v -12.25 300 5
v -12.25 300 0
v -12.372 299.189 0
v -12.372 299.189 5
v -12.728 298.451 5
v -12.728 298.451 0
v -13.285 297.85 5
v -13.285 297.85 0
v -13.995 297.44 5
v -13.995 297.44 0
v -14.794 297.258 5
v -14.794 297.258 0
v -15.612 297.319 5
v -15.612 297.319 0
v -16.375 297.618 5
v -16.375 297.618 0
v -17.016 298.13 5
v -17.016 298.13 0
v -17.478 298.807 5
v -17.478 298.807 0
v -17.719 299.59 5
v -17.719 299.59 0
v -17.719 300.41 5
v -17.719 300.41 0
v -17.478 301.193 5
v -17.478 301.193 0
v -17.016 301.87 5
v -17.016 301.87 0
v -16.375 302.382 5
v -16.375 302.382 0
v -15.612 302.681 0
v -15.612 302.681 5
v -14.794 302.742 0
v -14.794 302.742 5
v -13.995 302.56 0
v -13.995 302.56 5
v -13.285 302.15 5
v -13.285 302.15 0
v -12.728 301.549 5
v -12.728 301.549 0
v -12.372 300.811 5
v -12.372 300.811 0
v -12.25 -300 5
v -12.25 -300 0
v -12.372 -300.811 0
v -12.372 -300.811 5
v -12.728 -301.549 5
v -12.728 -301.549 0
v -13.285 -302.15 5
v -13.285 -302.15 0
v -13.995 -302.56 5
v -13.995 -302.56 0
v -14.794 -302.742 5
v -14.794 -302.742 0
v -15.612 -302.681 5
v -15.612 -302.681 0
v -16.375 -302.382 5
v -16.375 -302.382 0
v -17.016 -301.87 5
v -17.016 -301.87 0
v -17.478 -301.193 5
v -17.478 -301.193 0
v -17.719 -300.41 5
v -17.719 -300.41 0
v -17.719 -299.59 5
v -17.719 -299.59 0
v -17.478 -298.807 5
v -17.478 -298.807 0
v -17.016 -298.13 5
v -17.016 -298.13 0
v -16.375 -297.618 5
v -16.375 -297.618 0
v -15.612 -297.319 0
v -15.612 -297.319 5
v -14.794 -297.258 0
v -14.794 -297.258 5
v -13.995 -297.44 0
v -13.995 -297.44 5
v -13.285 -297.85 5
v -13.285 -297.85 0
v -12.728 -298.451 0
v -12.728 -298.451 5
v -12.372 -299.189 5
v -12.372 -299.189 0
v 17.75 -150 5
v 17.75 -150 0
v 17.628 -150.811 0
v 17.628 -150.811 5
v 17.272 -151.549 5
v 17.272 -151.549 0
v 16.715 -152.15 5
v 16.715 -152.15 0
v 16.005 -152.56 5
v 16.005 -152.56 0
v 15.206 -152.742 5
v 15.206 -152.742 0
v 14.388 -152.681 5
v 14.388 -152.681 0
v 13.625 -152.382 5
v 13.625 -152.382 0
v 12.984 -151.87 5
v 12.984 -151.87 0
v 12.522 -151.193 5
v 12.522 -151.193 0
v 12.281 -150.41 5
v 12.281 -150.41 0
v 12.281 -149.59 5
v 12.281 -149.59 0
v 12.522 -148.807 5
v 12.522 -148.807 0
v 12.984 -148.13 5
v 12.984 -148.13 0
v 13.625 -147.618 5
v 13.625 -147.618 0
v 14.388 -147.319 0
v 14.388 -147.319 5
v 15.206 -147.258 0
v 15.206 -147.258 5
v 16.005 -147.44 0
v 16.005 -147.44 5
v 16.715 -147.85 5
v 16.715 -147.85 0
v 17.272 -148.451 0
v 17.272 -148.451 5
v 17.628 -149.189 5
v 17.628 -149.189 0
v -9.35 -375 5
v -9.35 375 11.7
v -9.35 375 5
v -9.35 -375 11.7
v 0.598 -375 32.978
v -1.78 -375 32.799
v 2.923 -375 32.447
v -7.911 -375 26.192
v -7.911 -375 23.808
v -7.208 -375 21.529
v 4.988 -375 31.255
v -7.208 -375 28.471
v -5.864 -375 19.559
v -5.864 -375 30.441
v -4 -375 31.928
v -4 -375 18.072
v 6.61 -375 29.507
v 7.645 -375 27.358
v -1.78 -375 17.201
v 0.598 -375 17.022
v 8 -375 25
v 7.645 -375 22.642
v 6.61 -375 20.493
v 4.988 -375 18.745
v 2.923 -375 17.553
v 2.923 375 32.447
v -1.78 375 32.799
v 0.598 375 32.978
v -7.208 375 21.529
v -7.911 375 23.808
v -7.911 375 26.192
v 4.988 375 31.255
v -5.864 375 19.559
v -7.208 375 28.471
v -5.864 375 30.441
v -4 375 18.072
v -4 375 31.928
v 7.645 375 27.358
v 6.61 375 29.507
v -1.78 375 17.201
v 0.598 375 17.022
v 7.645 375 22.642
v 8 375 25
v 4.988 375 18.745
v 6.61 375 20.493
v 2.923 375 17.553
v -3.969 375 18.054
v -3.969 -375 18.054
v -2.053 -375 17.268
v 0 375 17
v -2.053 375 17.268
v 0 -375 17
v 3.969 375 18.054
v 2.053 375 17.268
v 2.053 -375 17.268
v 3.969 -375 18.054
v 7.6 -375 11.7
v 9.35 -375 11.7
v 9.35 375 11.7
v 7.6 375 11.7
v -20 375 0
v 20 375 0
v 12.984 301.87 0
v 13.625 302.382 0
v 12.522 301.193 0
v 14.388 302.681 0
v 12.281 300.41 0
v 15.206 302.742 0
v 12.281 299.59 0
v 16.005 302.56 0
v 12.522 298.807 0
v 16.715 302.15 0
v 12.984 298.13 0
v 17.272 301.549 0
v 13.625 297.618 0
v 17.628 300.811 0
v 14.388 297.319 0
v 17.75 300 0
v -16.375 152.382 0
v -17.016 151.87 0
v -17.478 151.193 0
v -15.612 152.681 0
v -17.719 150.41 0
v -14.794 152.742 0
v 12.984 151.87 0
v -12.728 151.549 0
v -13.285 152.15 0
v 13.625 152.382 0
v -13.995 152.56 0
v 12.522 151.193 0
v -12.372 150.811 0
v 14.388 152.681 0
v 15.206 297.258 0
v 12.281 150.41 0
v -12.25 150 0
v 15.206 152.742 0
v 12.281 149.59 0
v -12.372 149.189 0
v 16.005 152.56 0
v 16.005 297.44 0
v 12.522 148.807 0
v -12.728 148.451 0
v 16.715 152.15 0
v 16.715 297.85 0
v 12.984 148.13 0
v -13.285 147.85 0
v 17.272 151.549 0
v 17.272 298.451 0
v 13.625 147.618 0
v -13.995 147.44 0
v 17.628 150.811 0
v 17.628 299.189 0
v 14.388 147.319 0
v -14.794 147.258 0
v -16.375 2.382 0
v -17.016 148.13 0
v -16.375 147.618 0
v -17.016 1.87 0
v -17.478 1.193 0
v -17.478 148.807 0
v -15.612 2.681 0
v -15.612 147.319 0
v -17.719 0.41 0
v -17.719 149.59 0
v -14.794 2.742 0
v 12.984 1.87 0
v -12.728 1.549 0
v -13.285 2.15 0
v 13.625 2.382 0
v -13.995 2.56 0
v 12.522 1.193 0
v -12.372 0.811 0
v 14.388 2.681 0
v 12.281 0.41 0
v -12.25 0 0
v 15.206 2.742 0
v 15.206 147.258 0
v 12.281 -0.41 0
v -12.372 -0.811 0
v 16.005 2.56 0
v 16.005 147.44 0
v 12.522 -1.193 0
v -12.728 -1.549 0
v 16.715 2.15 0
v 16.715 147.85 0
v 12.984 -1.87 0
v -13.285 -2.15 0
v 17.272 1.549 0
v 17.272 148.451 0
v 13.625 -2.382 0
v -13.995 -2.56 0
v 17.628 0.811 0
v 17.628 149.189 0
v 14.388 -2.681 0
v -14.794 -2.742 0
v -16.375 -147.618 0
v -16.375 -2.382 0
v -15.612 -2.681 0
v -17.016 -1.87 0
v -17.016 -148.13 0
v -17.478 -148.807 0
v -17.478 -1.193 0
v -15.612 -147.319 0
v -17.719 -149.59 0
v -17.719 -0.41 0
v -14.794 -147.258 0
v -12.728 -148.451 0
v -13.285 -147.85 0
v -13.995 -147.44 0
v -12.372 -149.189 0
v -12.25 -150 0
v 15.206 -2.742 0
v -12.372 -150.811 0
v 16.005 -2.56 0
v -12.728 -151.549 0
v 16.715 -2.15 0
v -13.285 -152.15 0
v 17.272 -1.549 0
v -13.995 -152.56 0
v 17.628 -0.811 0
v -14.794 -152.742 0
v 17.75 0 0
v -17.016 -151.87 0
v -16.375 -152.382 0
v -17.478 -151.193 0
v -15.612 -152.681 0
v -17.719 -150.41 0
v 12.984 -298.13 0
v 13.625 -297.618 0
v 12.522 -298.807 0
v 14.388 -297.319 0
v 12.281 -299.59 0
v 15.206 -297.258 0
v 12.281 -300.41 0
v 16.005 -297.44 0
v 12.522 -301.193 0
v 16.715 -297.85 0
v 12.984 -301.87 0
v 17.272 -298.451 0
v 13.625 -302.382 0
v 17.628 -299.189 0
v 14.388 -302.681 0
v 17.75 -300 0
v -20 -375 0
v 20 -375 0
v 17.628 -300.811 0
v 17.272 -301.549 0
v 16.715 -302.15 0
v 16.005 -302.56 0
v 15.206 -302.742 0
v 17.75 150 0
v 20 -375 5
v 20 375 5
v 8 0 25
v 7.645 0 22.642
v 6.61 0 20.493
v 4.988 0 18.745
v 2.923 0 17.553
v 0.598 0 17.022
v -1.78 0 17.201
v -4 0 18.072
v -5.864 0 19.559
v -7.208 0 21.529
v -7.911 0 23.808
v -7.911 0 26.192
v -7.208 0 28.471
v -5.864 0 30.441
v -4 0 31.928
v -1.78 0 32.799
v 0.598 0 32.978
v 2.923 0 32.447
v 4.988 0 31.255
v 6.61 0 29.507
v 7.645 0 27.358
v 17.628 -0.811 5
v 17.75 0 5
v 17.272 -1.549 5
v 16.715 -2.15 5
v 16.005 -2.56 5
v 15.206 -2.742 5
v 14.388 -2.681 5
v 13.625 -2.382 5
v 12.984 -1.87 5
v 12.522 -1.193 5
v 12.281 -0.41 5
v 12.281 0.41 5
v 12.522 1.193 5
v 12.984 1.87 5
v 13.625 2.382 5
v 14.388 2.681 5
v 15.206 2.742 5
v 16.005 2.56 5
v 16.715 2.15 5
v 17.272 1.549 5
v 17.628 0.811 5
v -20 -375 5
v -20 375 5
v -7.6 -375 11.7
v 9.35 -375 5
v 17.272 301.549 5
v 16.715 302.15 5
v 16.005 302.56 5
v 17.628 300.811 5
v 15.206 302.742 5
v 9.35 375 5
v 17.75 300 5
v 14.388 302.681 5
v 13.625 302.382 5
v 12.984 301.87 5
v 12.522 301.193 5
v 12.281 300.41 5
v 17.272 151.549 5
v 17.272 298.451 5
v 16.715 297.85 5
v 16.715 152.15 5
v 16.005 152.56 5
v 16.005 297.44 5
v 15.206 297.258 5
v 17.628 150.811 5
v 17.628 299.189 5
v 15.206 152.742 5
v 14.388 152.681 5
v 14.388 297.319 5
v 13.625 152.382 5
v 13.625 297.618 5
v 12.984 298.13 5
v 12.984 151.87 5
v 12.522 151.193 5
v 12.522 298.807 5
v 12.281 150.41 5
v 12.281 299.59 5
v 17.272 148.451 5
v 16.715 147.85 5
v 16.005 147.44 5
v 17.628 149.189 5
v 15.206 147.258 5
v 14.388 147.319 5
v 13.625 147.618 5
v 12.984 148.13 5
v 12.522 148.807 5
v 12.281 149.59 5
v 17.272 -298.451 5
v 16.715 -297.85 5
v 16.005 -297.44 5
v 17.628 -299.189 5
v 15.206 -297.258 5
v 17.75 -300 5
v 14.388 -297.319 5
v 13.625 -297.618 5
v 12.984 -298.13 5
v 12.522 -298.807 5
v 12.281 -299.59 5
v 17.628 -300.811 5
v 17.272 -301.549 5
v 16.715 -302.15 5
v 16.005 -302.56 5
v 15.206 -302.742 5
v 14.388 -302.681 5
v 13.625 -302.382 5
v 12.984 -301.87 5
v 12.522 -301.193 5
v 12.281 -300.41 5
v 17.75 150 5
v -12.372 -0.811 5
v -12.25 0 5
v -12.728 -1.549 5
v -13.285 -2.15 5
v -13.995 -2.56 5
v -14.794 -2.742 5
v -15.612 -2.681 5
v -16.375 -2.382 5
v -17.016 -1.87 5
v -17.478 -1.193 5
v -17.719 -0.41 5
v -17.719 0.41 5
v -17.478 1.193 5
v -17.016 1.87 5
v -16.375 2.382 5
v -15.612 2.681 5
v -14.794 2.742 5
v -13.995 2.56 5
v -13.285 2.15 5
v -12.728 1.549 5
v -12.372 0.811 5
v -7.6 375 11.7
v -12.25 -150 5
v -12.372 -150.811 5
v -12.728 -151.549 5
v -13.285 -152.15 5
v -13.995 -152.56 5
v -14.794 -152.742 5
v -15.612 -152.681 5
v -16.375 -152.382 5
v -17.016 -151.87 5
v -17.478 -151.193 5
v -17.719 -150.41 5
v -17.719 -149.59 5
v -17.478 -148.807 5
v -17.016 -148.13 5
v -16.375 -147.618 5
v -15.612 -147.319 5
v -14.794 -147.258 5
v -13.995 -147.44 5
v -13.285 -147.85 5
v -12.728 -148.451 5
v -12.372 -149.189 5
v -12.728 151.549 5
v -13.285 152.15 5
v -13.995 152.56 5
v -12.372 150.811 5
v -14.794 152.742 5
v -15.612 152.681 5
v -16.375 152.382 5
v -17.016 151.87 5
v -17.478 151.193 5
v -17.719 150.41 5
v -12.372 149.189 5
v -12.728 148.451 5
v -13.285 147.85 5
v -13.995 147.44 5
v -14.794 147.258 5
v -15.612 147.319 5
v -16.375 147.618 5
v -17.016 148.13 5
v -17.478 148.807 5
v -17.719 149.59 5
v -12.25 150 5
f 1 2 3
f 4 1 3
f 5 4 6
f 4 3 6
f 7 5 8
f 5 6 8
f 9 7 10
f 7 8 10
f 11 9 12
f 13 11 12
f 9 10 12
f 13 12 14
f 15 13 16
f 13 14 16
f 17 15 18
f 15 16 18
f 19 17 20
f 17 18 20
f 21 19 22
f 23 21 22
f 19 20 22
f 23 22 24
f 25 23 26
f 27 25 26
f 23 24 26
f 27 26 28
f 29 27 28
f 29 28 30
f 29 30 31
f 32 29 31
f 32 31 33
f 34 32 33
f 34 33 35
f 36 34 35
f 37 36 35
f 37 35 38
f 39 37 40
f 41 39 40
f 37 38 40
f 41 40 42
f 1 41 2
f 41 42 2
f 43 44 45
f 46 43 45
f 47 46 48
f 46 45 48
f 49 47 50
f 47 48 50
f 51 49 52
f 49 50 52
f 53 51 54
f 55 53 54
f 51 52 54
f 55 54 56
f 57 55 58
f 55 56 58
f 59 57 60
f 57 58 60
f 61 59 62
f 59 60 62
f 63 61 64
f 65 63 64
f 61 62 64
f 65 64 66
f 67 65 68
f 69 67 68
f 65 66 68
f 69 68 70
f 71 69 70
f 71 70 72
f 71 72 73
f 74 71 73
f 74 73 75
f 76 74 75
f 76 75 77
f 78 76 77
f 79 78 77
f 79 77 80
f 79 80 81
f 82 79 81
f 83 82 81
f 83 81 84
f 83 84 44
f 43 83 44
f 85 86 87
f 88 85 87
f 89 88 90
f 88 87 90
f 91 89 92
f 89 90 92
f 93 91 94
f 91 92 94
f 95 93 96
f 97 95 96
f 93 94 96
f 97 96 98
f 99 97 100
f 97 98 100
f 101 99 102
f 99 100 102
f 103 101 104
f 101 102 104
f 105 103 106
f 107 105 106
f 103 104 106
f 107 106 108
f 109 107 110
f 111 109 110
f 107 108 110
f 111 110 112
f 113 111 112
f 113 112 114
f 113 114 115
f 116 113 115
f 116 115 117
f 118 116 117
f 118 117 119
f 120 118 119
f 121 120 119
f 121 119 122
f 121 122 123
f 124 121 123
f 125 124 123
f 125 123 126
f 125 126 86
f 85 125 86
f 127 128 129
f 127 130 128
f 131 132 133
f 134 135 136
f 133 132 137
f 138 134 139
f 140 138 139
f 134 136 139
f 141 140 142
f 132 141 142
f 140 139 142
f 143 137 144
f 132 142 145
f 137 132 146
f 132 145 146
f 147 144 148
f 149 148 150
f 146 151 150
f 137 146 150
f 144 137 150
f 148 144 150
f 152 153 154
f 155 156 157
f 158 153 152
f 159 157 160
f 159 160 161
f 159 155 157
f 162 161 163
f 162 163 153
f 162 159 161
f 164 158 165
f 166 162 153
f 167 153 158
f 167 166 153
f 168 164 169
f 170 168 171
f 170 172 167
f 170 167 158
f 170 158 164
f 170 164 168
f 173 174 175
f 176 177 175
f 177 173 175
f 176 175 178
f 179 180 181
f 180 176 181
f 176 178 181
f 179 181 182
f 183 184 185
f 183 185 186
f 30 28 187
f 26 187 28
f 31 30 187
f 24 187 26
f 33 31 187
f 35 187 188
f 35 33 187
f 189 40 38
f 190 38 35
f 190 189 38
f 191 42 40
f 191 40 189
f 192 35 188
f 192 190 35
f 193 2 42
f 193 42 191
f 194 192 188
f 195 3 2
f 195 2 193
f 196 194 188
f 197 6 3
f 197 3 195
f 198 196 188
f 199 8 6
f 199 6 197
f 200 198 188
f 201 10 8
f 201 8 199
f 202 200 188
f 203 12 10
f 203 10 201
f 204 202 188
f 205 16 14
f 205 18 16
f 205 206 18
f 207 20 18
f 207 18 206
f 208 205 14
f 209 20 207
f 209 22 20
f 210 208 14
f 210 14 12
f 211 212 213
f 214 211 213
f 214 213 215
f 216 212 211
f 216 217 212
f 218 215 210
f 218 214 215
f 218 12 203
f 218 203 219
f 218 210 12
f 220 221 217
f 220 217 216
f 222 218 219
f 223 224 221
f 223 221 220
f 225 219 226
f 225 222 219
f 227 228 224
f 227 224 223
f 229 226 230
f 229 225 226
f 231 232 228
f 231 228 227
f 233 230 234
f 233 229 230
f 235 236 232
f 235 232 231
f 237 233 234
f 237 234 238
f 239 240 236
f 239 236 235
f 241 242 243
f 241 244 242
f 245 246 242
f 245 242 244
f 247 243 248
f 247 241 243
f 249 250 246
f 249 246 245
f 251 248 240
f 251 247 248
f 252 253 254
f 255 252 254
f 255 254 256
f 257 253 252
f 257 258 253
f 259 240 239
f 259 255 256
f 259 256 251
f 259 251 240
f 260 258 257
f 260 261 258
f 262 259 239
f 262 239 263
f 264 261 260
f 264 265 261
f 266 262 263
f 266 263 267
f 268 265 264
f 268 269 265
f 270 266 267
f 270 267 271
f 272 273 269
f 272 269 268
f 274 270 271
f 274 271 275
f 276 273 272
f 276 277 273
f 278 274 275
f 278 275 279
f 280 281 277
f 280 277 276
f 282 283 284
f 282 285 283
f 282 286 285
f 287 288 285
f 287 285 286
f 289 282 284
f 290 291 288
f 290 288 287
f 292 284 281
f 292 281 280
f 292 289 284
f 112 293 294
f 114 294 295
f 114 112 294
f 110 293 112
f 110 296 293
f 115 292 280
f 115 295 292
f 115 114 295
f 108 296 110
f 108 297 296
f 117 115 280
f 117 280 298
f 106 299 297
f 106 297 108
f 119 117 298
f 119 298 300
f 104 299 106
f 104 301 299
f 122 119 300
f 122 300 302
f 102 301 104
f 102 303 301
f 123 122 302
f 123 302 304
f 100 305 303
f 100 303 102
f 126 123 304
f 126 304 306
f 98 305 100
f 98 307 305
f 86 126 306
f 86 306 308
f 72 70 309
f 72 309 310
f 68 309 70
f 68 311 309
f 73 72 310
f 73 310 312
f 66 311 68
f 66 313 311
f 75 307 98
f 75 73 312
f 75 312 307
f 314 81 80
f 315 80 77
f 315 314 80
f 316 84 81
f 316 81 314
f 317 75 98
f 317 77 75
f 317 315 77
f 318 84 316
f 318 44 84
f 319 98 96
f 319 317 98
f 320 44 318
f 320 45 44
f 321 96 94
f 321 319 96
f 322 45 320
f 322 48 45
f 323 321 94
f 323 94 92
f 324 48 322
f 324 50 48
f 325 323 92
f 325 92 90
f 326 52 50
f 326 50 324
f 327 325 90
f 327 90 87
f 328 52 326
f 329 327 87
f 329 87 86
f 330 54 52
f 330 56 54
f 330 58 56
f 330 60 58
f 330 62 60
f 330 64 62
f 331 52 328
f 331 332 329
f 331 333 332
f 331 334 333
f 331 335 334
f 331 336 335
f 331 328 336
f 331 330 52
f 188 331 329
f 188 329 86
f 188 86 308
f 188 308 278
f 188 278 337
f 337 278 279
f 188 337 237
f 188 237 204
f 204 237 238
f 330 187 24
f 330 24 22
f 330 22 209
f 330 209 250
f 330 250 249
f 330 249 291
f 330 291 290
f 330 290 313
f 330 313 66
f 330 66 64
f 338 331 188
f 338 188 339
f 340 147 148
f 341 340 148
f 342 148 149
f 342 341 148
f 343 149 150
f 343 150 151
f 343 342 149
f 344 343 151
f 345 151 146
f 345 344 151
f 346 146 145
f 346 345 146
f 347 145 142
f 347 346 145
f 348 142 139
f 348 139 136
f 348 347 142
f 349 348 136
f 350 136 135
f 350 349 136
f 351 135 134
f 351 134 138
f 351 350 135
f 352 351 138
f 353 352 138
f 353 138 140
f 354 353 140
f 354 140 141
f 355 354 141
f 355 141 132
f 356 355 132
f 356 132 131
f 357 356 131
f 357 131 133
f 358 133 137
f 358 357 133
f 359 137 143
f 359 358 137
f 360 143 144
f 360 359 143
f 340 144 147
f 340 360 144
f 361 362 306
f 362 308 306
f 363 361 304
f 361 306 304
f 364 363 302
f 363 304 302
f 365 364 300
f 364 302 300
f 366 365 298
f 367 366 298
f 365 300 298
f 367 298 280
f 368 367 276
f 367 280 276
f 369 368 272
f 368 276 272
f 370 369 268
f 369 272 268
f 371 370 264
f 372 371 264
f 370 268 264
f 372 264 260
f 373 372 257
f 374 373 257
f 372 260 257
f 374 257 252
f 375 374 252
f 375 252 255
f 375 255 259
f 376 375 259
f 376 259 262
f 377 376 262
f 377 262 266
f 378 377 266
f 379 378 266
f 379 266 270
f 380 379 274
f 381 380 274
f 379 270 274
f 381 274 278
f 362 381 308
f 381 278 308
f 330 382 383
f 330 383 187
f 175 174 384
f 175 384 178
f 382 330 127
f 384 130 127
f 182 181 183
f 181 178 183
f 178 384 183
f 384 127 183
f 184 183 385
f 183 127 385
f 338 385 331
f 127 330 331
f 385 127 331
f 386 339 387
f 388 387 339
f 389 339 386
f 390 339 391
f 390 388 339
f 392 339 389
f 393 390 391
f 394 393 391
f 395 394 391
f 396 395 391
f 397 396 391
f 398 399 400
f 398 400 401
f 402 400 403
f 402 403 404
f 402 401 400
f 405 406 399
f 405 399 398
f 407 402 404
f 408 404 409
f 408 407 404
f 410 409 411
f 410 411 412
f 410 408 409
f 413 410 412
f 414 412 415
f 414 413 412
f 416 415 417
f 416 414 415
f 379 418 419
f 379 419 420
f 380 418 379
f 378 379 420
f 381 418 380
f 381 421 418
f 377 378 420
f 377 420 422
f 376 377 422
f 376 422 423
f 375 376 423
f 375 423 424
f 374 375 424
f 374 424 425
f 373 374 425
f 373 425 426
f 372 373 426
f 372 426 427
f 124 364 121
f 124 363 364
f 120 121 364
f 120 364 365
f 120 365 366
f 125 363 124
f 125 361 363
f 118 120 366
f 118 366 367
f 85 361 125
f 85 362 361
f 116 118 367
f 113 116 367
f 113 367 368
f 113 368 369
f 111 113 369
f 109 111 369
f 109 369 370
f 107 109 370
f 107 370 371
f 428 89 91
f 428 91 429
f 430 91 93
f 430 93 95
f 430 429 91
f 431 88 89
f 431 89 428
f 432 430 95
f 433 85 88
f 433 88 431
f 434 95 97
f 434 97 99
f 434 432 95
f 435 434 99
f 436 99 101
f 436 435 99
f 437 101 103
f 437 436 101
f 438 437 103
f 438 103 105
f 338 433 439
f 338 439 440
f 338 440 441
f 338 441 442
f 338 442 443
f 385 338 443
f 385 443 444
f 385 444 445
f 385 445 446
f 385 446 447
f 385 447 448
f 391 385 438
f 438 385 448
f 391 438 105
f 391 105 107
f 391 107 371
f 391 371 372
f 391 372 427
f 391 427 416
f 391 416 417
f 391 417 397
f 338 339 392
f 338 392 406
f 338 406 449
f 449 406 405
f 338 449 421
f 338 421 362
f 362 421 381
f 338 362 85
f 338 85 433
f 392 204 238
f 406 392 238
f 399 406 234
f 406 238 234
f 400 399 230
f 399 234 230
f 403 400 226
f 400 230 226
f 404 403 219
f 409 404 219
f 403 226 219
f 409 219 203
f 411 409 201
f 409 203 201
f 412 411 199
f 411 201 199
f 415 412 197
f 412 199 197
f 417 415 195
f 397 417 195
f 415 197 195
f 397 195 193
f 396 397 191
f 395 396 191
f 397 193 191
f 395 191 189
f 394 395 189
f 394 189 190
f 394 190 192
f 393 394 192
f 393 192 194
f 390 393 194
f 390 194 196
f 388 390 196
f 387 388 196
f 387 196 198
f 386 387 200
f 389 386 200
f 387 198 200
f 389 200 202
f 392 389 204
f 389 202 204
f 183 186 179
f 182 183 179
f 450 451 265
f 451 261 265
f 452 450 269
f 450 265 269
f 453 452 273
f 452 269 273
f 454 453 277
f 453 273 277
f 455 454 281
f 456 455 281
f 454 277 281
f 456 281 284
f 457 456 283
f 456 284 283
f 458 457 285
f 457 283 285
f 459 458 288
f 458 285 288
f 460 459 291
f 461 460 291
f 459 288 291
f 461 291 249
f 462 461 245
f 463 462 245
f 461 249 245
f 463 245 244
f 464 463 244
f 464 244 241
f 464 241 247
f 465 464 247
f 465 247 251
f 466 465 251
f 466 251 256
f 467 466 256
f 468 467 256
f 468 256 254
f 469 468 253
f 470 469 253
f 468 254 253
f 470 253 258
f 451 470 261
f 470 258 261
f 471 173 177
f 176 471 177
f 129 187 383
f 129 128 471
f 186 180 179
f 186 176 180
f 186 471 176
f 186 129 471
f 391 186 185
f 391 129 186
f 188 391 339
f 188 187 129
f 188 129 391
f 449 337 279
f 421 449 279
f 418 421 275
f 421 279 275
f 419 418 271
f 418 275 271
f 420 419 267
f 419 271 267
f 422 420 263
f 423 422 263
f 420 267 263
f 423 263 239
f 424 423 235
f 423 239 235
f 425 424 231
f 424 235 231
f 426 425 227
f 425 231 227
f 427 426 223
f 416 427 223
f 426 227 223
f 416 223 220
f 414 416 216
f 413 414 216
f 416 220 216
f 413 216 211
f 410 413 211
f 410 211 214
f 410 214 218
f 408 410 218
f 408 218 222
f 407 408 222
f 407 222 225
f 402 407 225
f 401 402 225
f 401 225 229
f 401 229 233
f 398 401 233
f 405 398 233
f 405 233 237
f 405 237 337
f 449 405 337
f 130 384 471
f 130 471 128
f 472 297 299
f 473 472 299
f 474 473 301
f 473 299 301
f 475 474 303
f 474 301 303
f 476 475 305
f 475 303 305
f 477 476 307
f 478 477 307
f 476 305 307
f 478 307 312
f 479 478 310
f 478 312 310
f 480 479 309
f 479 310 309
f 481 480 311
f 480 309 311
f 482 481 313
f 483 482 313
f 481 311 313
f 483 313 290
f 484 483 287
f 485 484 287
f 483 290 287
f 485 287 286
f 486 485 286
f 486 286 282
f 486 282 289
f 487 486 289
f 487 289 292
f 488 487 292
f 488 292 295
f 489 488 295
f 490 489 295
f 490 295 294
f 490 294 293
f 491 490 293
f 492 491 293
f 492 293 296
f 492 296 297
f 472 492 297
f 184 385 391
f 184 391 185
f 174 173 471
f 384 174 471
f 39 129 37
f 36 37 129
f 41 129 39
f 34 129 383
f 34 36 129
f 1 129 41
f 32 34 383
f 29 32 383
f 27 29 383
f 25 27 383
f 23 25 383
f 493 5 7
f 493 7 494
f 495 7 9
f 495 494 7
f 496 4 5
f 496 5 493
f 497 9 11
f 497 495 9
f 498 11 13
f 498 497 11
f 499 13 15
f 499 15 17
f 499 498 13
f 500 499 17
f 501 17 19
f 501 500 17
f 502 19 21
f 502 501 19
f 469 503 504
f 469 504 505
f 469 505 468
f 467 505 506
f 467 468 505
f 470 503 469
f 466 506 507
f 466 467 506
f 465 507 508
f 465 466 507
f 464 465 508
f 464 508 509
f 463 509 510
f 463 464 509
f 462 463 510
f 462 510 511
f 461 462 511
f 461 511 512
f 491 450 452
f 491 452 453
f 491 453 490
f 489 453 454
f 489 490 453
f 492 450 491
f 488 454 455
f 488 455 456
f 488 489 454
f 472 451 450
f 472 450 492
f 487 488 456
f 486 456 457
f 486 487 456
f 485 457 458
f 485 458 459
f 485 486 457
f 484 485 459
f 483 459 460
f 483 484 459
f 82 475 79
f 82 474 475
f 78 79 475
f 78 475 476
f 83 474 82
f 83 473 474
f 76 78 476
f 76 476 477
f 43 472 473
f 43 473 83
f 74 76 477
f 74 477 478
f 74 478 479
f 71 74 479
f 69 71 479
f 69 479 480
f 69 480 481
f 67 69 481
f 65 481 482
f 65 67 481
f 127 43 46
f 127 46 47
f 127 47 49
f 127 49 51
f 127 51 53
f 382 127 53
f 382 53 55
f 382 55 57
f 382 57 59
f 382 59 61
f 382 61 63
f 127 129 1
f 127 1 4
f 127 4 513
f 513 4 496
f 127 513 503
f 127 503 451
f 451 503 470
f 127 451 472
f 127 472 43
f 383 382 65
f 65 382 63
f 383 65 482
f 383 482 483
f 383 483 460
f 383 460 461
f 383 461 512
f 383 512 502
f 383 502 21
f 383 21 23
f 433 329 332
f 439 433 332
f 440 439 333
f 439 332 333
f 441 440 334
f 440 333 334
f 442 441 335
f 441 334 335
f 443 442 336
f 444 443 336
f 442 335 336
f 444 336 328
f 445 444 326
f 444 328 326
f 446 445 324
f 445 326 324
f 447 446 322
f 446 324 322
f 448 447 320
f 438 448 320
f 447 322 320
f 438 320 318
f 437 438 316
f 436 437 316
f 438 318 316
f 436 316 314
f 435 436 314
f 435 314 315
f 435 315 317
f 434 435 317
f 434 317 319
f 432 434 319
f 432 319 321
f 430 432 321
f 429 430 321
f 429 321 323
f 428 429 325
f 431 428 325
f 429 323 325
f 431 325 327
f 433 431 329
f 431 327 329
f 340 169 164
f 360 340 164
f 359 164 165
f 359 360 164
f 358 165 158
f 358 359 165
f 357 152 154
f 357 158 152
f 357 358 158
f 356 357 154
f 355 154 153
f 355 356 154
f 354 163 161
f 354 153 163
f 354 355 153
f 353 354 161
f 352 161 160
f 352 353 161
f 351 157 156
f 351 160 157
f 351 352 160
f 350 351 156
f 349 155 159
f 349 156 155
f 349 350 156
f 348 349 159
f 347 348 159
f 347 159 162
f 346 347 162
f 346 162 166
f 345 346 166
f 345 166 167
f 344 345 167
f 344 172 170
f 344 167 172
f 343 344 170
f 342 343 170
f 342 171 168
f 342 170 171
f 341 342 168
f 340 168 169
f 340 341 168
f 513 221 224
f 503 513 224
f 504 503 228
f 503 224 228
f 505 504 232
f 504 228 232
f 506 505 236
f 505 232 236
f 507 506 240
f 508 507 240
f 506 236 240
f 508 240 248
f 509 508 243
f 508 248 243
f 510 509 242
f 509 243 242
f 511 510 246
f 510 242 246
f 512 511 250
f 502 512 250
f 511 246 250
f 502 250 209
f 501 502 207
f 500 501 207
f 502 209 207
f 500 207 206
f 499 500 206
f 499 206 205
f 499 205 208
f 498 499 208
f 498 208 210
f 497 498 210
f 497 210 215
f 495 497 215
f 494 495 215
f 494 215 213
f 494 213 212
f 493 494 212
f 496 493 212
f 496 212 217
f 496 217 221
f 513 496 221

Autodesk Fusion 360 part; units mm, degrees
sketch "Alu Support" plane through (0, 0, 0) normal (0, 1, 0) x (1, 0, 0)
  line L0 (-20, 0.0005) -> (20, 0.0005)
  line L1 (20, 0.0005) -> (20, -4.9995)
  line L2 (20, -4.9995) -> (9.35, -4.9995)
  line L3 (9.35, -4.9995) -> (9.35, -11.6995)
  line L4 (9.35, -11.6995) -> (7.6, -11.6995)
  line L5 (7.6, -11.6995) -> (3.9691, -18.0536)
  line L6 (-3.9691, -18.0536) -> (-7.6, -11.6995)
  line L7 (-7.6, -11.6995) -> (-9.35, -11.6995)
  line L8 (-9.35, -11.6995) -> (-9.35, -4.9995)
  line L9 (-9.35, -4.9995) -> (-20, -4.9995)
  line L10 (-20, -4.9995) -> (-20, 0.0005)
  arc A0 (3.9691, -18.0536) -> (-3.9691, -18.0536) centre (0, -24.9995) ccw
  dimension "d3" = 40
  dimension "d4" = 18.7
  dimension "d5" = 1.75
  dimension "d6" = 25
  dimension "d7" = 6.7
  dimension "d8" = 5
sketch "Steel Rail" plane through (0, 0, 0) normal (0, 1, 0) x (1, 0, 0)
  circle A0 centre (0, -25) radius 8
extrude "Extrude1" add sketch "Alu Support" along normal mid plane 750 makes body 1
extrude "Extrude2" add sketch "Steel Rail" along normal mid plane 750 separate body makes body 2
copy_body "CutPasteBodies1" bodies 1 2 removing the originals makes body 3 makes body 4 in component "SBR16-750"
sketch "Holes" plane through (0, 0, -0.0005) normal (0, 0, -1) x (1, 0, 0)
  line L0 (-20, 375) -> (-20, -375)
  line L1 (-20, -375) -> (20, -375)
  line L2 (20, -375) -> (20, 375)
  line L3 (20, 375) -> (-20, 375)
  line L4 (15, 375) -> (15, -375) construction
  line L5 (-15, 375) -> (-15, -375) construction
  line L6 (25, 300) -> (-25, 300) construction
  line L7 (25, 150) -> (-25, 150) construction
  line L8 (25, 0) -> (-25, 0) construction
  line L9 (25, -150) -> (-25, -150) construction
  line L10 (25, -300) -> (-25, -300) construction
  circle A0 centre (15, -300) radius 2.75
  circle A1 centre (-15, -300) radius 2.75
  circle A2 centre (15, -150) radius 2.75
  circle A3 centre (-15, -150) radius 2.75
  circle A4 centre (-15, 0) radius 2.75
  circle A5 centre (15, 0) radius 2.75
  circle A6 centre (15, 150) radius 2.75
  circle A7 centre (-15, 150) radius 2.75
  circle A8 centre (15, 300) radius 2.75
  circle A9 centre (-15, 300) radius 2.75
  dimension "d15" = 5
  dimension "d16" = 5
  dimension "d17" = 30
  dimension "d18" = 150
  dimension "d19" = 150
  dimension "d20" = 150
  dimension "d21" = 150
  dimension "d22" = 75
  dimension "d23" = 75
  dimension "d24" = 5.5
  dimension "d25" = 5.5
  dimension "d26" = 5.5
  dimension "d27" = 5.5
  dimension "d28" = 5.5
  dimension "d29" = 5.5
  dimension "d30" = 5.5
  dimension "d31" = 5.5
  dimension "d32" = 5.5
  dimension "d33" = 5.5
extrude "Extrude1'" cut sketch "Holes" against normal blind 6 contours A8 | A9 bodies 3 in component "SBR16-750"
extrude "Extrude2'" cut sketch "Holes" against normal blind 6 contours A6 | A7 bodies 3 in component "SBR16-750"
extrude "Extrude3" cut sketch "Holes" against normal blind 6 contours A4 | A5 bodies 3 in component "SBR16-750"
extrude "Extrude4" cut sketch "Holes" against normal blind 6 contours A2 | A3 bodies 3 in component "SBR16-750"
extrude "Extrude5" cut sketch "Holes" against normal blind 6 contours A0 bodies 3 in component "SBR16-750"
extrude "Extrude6" cut sketch "Holes" against normal blind 6 contours A1 bodies 3 in component "SBR16-750"
component "SBR16-750" placed x (1, 0, 0) y (0, 1, 0) z (0, 0, 1) at (0, 0, 0)
